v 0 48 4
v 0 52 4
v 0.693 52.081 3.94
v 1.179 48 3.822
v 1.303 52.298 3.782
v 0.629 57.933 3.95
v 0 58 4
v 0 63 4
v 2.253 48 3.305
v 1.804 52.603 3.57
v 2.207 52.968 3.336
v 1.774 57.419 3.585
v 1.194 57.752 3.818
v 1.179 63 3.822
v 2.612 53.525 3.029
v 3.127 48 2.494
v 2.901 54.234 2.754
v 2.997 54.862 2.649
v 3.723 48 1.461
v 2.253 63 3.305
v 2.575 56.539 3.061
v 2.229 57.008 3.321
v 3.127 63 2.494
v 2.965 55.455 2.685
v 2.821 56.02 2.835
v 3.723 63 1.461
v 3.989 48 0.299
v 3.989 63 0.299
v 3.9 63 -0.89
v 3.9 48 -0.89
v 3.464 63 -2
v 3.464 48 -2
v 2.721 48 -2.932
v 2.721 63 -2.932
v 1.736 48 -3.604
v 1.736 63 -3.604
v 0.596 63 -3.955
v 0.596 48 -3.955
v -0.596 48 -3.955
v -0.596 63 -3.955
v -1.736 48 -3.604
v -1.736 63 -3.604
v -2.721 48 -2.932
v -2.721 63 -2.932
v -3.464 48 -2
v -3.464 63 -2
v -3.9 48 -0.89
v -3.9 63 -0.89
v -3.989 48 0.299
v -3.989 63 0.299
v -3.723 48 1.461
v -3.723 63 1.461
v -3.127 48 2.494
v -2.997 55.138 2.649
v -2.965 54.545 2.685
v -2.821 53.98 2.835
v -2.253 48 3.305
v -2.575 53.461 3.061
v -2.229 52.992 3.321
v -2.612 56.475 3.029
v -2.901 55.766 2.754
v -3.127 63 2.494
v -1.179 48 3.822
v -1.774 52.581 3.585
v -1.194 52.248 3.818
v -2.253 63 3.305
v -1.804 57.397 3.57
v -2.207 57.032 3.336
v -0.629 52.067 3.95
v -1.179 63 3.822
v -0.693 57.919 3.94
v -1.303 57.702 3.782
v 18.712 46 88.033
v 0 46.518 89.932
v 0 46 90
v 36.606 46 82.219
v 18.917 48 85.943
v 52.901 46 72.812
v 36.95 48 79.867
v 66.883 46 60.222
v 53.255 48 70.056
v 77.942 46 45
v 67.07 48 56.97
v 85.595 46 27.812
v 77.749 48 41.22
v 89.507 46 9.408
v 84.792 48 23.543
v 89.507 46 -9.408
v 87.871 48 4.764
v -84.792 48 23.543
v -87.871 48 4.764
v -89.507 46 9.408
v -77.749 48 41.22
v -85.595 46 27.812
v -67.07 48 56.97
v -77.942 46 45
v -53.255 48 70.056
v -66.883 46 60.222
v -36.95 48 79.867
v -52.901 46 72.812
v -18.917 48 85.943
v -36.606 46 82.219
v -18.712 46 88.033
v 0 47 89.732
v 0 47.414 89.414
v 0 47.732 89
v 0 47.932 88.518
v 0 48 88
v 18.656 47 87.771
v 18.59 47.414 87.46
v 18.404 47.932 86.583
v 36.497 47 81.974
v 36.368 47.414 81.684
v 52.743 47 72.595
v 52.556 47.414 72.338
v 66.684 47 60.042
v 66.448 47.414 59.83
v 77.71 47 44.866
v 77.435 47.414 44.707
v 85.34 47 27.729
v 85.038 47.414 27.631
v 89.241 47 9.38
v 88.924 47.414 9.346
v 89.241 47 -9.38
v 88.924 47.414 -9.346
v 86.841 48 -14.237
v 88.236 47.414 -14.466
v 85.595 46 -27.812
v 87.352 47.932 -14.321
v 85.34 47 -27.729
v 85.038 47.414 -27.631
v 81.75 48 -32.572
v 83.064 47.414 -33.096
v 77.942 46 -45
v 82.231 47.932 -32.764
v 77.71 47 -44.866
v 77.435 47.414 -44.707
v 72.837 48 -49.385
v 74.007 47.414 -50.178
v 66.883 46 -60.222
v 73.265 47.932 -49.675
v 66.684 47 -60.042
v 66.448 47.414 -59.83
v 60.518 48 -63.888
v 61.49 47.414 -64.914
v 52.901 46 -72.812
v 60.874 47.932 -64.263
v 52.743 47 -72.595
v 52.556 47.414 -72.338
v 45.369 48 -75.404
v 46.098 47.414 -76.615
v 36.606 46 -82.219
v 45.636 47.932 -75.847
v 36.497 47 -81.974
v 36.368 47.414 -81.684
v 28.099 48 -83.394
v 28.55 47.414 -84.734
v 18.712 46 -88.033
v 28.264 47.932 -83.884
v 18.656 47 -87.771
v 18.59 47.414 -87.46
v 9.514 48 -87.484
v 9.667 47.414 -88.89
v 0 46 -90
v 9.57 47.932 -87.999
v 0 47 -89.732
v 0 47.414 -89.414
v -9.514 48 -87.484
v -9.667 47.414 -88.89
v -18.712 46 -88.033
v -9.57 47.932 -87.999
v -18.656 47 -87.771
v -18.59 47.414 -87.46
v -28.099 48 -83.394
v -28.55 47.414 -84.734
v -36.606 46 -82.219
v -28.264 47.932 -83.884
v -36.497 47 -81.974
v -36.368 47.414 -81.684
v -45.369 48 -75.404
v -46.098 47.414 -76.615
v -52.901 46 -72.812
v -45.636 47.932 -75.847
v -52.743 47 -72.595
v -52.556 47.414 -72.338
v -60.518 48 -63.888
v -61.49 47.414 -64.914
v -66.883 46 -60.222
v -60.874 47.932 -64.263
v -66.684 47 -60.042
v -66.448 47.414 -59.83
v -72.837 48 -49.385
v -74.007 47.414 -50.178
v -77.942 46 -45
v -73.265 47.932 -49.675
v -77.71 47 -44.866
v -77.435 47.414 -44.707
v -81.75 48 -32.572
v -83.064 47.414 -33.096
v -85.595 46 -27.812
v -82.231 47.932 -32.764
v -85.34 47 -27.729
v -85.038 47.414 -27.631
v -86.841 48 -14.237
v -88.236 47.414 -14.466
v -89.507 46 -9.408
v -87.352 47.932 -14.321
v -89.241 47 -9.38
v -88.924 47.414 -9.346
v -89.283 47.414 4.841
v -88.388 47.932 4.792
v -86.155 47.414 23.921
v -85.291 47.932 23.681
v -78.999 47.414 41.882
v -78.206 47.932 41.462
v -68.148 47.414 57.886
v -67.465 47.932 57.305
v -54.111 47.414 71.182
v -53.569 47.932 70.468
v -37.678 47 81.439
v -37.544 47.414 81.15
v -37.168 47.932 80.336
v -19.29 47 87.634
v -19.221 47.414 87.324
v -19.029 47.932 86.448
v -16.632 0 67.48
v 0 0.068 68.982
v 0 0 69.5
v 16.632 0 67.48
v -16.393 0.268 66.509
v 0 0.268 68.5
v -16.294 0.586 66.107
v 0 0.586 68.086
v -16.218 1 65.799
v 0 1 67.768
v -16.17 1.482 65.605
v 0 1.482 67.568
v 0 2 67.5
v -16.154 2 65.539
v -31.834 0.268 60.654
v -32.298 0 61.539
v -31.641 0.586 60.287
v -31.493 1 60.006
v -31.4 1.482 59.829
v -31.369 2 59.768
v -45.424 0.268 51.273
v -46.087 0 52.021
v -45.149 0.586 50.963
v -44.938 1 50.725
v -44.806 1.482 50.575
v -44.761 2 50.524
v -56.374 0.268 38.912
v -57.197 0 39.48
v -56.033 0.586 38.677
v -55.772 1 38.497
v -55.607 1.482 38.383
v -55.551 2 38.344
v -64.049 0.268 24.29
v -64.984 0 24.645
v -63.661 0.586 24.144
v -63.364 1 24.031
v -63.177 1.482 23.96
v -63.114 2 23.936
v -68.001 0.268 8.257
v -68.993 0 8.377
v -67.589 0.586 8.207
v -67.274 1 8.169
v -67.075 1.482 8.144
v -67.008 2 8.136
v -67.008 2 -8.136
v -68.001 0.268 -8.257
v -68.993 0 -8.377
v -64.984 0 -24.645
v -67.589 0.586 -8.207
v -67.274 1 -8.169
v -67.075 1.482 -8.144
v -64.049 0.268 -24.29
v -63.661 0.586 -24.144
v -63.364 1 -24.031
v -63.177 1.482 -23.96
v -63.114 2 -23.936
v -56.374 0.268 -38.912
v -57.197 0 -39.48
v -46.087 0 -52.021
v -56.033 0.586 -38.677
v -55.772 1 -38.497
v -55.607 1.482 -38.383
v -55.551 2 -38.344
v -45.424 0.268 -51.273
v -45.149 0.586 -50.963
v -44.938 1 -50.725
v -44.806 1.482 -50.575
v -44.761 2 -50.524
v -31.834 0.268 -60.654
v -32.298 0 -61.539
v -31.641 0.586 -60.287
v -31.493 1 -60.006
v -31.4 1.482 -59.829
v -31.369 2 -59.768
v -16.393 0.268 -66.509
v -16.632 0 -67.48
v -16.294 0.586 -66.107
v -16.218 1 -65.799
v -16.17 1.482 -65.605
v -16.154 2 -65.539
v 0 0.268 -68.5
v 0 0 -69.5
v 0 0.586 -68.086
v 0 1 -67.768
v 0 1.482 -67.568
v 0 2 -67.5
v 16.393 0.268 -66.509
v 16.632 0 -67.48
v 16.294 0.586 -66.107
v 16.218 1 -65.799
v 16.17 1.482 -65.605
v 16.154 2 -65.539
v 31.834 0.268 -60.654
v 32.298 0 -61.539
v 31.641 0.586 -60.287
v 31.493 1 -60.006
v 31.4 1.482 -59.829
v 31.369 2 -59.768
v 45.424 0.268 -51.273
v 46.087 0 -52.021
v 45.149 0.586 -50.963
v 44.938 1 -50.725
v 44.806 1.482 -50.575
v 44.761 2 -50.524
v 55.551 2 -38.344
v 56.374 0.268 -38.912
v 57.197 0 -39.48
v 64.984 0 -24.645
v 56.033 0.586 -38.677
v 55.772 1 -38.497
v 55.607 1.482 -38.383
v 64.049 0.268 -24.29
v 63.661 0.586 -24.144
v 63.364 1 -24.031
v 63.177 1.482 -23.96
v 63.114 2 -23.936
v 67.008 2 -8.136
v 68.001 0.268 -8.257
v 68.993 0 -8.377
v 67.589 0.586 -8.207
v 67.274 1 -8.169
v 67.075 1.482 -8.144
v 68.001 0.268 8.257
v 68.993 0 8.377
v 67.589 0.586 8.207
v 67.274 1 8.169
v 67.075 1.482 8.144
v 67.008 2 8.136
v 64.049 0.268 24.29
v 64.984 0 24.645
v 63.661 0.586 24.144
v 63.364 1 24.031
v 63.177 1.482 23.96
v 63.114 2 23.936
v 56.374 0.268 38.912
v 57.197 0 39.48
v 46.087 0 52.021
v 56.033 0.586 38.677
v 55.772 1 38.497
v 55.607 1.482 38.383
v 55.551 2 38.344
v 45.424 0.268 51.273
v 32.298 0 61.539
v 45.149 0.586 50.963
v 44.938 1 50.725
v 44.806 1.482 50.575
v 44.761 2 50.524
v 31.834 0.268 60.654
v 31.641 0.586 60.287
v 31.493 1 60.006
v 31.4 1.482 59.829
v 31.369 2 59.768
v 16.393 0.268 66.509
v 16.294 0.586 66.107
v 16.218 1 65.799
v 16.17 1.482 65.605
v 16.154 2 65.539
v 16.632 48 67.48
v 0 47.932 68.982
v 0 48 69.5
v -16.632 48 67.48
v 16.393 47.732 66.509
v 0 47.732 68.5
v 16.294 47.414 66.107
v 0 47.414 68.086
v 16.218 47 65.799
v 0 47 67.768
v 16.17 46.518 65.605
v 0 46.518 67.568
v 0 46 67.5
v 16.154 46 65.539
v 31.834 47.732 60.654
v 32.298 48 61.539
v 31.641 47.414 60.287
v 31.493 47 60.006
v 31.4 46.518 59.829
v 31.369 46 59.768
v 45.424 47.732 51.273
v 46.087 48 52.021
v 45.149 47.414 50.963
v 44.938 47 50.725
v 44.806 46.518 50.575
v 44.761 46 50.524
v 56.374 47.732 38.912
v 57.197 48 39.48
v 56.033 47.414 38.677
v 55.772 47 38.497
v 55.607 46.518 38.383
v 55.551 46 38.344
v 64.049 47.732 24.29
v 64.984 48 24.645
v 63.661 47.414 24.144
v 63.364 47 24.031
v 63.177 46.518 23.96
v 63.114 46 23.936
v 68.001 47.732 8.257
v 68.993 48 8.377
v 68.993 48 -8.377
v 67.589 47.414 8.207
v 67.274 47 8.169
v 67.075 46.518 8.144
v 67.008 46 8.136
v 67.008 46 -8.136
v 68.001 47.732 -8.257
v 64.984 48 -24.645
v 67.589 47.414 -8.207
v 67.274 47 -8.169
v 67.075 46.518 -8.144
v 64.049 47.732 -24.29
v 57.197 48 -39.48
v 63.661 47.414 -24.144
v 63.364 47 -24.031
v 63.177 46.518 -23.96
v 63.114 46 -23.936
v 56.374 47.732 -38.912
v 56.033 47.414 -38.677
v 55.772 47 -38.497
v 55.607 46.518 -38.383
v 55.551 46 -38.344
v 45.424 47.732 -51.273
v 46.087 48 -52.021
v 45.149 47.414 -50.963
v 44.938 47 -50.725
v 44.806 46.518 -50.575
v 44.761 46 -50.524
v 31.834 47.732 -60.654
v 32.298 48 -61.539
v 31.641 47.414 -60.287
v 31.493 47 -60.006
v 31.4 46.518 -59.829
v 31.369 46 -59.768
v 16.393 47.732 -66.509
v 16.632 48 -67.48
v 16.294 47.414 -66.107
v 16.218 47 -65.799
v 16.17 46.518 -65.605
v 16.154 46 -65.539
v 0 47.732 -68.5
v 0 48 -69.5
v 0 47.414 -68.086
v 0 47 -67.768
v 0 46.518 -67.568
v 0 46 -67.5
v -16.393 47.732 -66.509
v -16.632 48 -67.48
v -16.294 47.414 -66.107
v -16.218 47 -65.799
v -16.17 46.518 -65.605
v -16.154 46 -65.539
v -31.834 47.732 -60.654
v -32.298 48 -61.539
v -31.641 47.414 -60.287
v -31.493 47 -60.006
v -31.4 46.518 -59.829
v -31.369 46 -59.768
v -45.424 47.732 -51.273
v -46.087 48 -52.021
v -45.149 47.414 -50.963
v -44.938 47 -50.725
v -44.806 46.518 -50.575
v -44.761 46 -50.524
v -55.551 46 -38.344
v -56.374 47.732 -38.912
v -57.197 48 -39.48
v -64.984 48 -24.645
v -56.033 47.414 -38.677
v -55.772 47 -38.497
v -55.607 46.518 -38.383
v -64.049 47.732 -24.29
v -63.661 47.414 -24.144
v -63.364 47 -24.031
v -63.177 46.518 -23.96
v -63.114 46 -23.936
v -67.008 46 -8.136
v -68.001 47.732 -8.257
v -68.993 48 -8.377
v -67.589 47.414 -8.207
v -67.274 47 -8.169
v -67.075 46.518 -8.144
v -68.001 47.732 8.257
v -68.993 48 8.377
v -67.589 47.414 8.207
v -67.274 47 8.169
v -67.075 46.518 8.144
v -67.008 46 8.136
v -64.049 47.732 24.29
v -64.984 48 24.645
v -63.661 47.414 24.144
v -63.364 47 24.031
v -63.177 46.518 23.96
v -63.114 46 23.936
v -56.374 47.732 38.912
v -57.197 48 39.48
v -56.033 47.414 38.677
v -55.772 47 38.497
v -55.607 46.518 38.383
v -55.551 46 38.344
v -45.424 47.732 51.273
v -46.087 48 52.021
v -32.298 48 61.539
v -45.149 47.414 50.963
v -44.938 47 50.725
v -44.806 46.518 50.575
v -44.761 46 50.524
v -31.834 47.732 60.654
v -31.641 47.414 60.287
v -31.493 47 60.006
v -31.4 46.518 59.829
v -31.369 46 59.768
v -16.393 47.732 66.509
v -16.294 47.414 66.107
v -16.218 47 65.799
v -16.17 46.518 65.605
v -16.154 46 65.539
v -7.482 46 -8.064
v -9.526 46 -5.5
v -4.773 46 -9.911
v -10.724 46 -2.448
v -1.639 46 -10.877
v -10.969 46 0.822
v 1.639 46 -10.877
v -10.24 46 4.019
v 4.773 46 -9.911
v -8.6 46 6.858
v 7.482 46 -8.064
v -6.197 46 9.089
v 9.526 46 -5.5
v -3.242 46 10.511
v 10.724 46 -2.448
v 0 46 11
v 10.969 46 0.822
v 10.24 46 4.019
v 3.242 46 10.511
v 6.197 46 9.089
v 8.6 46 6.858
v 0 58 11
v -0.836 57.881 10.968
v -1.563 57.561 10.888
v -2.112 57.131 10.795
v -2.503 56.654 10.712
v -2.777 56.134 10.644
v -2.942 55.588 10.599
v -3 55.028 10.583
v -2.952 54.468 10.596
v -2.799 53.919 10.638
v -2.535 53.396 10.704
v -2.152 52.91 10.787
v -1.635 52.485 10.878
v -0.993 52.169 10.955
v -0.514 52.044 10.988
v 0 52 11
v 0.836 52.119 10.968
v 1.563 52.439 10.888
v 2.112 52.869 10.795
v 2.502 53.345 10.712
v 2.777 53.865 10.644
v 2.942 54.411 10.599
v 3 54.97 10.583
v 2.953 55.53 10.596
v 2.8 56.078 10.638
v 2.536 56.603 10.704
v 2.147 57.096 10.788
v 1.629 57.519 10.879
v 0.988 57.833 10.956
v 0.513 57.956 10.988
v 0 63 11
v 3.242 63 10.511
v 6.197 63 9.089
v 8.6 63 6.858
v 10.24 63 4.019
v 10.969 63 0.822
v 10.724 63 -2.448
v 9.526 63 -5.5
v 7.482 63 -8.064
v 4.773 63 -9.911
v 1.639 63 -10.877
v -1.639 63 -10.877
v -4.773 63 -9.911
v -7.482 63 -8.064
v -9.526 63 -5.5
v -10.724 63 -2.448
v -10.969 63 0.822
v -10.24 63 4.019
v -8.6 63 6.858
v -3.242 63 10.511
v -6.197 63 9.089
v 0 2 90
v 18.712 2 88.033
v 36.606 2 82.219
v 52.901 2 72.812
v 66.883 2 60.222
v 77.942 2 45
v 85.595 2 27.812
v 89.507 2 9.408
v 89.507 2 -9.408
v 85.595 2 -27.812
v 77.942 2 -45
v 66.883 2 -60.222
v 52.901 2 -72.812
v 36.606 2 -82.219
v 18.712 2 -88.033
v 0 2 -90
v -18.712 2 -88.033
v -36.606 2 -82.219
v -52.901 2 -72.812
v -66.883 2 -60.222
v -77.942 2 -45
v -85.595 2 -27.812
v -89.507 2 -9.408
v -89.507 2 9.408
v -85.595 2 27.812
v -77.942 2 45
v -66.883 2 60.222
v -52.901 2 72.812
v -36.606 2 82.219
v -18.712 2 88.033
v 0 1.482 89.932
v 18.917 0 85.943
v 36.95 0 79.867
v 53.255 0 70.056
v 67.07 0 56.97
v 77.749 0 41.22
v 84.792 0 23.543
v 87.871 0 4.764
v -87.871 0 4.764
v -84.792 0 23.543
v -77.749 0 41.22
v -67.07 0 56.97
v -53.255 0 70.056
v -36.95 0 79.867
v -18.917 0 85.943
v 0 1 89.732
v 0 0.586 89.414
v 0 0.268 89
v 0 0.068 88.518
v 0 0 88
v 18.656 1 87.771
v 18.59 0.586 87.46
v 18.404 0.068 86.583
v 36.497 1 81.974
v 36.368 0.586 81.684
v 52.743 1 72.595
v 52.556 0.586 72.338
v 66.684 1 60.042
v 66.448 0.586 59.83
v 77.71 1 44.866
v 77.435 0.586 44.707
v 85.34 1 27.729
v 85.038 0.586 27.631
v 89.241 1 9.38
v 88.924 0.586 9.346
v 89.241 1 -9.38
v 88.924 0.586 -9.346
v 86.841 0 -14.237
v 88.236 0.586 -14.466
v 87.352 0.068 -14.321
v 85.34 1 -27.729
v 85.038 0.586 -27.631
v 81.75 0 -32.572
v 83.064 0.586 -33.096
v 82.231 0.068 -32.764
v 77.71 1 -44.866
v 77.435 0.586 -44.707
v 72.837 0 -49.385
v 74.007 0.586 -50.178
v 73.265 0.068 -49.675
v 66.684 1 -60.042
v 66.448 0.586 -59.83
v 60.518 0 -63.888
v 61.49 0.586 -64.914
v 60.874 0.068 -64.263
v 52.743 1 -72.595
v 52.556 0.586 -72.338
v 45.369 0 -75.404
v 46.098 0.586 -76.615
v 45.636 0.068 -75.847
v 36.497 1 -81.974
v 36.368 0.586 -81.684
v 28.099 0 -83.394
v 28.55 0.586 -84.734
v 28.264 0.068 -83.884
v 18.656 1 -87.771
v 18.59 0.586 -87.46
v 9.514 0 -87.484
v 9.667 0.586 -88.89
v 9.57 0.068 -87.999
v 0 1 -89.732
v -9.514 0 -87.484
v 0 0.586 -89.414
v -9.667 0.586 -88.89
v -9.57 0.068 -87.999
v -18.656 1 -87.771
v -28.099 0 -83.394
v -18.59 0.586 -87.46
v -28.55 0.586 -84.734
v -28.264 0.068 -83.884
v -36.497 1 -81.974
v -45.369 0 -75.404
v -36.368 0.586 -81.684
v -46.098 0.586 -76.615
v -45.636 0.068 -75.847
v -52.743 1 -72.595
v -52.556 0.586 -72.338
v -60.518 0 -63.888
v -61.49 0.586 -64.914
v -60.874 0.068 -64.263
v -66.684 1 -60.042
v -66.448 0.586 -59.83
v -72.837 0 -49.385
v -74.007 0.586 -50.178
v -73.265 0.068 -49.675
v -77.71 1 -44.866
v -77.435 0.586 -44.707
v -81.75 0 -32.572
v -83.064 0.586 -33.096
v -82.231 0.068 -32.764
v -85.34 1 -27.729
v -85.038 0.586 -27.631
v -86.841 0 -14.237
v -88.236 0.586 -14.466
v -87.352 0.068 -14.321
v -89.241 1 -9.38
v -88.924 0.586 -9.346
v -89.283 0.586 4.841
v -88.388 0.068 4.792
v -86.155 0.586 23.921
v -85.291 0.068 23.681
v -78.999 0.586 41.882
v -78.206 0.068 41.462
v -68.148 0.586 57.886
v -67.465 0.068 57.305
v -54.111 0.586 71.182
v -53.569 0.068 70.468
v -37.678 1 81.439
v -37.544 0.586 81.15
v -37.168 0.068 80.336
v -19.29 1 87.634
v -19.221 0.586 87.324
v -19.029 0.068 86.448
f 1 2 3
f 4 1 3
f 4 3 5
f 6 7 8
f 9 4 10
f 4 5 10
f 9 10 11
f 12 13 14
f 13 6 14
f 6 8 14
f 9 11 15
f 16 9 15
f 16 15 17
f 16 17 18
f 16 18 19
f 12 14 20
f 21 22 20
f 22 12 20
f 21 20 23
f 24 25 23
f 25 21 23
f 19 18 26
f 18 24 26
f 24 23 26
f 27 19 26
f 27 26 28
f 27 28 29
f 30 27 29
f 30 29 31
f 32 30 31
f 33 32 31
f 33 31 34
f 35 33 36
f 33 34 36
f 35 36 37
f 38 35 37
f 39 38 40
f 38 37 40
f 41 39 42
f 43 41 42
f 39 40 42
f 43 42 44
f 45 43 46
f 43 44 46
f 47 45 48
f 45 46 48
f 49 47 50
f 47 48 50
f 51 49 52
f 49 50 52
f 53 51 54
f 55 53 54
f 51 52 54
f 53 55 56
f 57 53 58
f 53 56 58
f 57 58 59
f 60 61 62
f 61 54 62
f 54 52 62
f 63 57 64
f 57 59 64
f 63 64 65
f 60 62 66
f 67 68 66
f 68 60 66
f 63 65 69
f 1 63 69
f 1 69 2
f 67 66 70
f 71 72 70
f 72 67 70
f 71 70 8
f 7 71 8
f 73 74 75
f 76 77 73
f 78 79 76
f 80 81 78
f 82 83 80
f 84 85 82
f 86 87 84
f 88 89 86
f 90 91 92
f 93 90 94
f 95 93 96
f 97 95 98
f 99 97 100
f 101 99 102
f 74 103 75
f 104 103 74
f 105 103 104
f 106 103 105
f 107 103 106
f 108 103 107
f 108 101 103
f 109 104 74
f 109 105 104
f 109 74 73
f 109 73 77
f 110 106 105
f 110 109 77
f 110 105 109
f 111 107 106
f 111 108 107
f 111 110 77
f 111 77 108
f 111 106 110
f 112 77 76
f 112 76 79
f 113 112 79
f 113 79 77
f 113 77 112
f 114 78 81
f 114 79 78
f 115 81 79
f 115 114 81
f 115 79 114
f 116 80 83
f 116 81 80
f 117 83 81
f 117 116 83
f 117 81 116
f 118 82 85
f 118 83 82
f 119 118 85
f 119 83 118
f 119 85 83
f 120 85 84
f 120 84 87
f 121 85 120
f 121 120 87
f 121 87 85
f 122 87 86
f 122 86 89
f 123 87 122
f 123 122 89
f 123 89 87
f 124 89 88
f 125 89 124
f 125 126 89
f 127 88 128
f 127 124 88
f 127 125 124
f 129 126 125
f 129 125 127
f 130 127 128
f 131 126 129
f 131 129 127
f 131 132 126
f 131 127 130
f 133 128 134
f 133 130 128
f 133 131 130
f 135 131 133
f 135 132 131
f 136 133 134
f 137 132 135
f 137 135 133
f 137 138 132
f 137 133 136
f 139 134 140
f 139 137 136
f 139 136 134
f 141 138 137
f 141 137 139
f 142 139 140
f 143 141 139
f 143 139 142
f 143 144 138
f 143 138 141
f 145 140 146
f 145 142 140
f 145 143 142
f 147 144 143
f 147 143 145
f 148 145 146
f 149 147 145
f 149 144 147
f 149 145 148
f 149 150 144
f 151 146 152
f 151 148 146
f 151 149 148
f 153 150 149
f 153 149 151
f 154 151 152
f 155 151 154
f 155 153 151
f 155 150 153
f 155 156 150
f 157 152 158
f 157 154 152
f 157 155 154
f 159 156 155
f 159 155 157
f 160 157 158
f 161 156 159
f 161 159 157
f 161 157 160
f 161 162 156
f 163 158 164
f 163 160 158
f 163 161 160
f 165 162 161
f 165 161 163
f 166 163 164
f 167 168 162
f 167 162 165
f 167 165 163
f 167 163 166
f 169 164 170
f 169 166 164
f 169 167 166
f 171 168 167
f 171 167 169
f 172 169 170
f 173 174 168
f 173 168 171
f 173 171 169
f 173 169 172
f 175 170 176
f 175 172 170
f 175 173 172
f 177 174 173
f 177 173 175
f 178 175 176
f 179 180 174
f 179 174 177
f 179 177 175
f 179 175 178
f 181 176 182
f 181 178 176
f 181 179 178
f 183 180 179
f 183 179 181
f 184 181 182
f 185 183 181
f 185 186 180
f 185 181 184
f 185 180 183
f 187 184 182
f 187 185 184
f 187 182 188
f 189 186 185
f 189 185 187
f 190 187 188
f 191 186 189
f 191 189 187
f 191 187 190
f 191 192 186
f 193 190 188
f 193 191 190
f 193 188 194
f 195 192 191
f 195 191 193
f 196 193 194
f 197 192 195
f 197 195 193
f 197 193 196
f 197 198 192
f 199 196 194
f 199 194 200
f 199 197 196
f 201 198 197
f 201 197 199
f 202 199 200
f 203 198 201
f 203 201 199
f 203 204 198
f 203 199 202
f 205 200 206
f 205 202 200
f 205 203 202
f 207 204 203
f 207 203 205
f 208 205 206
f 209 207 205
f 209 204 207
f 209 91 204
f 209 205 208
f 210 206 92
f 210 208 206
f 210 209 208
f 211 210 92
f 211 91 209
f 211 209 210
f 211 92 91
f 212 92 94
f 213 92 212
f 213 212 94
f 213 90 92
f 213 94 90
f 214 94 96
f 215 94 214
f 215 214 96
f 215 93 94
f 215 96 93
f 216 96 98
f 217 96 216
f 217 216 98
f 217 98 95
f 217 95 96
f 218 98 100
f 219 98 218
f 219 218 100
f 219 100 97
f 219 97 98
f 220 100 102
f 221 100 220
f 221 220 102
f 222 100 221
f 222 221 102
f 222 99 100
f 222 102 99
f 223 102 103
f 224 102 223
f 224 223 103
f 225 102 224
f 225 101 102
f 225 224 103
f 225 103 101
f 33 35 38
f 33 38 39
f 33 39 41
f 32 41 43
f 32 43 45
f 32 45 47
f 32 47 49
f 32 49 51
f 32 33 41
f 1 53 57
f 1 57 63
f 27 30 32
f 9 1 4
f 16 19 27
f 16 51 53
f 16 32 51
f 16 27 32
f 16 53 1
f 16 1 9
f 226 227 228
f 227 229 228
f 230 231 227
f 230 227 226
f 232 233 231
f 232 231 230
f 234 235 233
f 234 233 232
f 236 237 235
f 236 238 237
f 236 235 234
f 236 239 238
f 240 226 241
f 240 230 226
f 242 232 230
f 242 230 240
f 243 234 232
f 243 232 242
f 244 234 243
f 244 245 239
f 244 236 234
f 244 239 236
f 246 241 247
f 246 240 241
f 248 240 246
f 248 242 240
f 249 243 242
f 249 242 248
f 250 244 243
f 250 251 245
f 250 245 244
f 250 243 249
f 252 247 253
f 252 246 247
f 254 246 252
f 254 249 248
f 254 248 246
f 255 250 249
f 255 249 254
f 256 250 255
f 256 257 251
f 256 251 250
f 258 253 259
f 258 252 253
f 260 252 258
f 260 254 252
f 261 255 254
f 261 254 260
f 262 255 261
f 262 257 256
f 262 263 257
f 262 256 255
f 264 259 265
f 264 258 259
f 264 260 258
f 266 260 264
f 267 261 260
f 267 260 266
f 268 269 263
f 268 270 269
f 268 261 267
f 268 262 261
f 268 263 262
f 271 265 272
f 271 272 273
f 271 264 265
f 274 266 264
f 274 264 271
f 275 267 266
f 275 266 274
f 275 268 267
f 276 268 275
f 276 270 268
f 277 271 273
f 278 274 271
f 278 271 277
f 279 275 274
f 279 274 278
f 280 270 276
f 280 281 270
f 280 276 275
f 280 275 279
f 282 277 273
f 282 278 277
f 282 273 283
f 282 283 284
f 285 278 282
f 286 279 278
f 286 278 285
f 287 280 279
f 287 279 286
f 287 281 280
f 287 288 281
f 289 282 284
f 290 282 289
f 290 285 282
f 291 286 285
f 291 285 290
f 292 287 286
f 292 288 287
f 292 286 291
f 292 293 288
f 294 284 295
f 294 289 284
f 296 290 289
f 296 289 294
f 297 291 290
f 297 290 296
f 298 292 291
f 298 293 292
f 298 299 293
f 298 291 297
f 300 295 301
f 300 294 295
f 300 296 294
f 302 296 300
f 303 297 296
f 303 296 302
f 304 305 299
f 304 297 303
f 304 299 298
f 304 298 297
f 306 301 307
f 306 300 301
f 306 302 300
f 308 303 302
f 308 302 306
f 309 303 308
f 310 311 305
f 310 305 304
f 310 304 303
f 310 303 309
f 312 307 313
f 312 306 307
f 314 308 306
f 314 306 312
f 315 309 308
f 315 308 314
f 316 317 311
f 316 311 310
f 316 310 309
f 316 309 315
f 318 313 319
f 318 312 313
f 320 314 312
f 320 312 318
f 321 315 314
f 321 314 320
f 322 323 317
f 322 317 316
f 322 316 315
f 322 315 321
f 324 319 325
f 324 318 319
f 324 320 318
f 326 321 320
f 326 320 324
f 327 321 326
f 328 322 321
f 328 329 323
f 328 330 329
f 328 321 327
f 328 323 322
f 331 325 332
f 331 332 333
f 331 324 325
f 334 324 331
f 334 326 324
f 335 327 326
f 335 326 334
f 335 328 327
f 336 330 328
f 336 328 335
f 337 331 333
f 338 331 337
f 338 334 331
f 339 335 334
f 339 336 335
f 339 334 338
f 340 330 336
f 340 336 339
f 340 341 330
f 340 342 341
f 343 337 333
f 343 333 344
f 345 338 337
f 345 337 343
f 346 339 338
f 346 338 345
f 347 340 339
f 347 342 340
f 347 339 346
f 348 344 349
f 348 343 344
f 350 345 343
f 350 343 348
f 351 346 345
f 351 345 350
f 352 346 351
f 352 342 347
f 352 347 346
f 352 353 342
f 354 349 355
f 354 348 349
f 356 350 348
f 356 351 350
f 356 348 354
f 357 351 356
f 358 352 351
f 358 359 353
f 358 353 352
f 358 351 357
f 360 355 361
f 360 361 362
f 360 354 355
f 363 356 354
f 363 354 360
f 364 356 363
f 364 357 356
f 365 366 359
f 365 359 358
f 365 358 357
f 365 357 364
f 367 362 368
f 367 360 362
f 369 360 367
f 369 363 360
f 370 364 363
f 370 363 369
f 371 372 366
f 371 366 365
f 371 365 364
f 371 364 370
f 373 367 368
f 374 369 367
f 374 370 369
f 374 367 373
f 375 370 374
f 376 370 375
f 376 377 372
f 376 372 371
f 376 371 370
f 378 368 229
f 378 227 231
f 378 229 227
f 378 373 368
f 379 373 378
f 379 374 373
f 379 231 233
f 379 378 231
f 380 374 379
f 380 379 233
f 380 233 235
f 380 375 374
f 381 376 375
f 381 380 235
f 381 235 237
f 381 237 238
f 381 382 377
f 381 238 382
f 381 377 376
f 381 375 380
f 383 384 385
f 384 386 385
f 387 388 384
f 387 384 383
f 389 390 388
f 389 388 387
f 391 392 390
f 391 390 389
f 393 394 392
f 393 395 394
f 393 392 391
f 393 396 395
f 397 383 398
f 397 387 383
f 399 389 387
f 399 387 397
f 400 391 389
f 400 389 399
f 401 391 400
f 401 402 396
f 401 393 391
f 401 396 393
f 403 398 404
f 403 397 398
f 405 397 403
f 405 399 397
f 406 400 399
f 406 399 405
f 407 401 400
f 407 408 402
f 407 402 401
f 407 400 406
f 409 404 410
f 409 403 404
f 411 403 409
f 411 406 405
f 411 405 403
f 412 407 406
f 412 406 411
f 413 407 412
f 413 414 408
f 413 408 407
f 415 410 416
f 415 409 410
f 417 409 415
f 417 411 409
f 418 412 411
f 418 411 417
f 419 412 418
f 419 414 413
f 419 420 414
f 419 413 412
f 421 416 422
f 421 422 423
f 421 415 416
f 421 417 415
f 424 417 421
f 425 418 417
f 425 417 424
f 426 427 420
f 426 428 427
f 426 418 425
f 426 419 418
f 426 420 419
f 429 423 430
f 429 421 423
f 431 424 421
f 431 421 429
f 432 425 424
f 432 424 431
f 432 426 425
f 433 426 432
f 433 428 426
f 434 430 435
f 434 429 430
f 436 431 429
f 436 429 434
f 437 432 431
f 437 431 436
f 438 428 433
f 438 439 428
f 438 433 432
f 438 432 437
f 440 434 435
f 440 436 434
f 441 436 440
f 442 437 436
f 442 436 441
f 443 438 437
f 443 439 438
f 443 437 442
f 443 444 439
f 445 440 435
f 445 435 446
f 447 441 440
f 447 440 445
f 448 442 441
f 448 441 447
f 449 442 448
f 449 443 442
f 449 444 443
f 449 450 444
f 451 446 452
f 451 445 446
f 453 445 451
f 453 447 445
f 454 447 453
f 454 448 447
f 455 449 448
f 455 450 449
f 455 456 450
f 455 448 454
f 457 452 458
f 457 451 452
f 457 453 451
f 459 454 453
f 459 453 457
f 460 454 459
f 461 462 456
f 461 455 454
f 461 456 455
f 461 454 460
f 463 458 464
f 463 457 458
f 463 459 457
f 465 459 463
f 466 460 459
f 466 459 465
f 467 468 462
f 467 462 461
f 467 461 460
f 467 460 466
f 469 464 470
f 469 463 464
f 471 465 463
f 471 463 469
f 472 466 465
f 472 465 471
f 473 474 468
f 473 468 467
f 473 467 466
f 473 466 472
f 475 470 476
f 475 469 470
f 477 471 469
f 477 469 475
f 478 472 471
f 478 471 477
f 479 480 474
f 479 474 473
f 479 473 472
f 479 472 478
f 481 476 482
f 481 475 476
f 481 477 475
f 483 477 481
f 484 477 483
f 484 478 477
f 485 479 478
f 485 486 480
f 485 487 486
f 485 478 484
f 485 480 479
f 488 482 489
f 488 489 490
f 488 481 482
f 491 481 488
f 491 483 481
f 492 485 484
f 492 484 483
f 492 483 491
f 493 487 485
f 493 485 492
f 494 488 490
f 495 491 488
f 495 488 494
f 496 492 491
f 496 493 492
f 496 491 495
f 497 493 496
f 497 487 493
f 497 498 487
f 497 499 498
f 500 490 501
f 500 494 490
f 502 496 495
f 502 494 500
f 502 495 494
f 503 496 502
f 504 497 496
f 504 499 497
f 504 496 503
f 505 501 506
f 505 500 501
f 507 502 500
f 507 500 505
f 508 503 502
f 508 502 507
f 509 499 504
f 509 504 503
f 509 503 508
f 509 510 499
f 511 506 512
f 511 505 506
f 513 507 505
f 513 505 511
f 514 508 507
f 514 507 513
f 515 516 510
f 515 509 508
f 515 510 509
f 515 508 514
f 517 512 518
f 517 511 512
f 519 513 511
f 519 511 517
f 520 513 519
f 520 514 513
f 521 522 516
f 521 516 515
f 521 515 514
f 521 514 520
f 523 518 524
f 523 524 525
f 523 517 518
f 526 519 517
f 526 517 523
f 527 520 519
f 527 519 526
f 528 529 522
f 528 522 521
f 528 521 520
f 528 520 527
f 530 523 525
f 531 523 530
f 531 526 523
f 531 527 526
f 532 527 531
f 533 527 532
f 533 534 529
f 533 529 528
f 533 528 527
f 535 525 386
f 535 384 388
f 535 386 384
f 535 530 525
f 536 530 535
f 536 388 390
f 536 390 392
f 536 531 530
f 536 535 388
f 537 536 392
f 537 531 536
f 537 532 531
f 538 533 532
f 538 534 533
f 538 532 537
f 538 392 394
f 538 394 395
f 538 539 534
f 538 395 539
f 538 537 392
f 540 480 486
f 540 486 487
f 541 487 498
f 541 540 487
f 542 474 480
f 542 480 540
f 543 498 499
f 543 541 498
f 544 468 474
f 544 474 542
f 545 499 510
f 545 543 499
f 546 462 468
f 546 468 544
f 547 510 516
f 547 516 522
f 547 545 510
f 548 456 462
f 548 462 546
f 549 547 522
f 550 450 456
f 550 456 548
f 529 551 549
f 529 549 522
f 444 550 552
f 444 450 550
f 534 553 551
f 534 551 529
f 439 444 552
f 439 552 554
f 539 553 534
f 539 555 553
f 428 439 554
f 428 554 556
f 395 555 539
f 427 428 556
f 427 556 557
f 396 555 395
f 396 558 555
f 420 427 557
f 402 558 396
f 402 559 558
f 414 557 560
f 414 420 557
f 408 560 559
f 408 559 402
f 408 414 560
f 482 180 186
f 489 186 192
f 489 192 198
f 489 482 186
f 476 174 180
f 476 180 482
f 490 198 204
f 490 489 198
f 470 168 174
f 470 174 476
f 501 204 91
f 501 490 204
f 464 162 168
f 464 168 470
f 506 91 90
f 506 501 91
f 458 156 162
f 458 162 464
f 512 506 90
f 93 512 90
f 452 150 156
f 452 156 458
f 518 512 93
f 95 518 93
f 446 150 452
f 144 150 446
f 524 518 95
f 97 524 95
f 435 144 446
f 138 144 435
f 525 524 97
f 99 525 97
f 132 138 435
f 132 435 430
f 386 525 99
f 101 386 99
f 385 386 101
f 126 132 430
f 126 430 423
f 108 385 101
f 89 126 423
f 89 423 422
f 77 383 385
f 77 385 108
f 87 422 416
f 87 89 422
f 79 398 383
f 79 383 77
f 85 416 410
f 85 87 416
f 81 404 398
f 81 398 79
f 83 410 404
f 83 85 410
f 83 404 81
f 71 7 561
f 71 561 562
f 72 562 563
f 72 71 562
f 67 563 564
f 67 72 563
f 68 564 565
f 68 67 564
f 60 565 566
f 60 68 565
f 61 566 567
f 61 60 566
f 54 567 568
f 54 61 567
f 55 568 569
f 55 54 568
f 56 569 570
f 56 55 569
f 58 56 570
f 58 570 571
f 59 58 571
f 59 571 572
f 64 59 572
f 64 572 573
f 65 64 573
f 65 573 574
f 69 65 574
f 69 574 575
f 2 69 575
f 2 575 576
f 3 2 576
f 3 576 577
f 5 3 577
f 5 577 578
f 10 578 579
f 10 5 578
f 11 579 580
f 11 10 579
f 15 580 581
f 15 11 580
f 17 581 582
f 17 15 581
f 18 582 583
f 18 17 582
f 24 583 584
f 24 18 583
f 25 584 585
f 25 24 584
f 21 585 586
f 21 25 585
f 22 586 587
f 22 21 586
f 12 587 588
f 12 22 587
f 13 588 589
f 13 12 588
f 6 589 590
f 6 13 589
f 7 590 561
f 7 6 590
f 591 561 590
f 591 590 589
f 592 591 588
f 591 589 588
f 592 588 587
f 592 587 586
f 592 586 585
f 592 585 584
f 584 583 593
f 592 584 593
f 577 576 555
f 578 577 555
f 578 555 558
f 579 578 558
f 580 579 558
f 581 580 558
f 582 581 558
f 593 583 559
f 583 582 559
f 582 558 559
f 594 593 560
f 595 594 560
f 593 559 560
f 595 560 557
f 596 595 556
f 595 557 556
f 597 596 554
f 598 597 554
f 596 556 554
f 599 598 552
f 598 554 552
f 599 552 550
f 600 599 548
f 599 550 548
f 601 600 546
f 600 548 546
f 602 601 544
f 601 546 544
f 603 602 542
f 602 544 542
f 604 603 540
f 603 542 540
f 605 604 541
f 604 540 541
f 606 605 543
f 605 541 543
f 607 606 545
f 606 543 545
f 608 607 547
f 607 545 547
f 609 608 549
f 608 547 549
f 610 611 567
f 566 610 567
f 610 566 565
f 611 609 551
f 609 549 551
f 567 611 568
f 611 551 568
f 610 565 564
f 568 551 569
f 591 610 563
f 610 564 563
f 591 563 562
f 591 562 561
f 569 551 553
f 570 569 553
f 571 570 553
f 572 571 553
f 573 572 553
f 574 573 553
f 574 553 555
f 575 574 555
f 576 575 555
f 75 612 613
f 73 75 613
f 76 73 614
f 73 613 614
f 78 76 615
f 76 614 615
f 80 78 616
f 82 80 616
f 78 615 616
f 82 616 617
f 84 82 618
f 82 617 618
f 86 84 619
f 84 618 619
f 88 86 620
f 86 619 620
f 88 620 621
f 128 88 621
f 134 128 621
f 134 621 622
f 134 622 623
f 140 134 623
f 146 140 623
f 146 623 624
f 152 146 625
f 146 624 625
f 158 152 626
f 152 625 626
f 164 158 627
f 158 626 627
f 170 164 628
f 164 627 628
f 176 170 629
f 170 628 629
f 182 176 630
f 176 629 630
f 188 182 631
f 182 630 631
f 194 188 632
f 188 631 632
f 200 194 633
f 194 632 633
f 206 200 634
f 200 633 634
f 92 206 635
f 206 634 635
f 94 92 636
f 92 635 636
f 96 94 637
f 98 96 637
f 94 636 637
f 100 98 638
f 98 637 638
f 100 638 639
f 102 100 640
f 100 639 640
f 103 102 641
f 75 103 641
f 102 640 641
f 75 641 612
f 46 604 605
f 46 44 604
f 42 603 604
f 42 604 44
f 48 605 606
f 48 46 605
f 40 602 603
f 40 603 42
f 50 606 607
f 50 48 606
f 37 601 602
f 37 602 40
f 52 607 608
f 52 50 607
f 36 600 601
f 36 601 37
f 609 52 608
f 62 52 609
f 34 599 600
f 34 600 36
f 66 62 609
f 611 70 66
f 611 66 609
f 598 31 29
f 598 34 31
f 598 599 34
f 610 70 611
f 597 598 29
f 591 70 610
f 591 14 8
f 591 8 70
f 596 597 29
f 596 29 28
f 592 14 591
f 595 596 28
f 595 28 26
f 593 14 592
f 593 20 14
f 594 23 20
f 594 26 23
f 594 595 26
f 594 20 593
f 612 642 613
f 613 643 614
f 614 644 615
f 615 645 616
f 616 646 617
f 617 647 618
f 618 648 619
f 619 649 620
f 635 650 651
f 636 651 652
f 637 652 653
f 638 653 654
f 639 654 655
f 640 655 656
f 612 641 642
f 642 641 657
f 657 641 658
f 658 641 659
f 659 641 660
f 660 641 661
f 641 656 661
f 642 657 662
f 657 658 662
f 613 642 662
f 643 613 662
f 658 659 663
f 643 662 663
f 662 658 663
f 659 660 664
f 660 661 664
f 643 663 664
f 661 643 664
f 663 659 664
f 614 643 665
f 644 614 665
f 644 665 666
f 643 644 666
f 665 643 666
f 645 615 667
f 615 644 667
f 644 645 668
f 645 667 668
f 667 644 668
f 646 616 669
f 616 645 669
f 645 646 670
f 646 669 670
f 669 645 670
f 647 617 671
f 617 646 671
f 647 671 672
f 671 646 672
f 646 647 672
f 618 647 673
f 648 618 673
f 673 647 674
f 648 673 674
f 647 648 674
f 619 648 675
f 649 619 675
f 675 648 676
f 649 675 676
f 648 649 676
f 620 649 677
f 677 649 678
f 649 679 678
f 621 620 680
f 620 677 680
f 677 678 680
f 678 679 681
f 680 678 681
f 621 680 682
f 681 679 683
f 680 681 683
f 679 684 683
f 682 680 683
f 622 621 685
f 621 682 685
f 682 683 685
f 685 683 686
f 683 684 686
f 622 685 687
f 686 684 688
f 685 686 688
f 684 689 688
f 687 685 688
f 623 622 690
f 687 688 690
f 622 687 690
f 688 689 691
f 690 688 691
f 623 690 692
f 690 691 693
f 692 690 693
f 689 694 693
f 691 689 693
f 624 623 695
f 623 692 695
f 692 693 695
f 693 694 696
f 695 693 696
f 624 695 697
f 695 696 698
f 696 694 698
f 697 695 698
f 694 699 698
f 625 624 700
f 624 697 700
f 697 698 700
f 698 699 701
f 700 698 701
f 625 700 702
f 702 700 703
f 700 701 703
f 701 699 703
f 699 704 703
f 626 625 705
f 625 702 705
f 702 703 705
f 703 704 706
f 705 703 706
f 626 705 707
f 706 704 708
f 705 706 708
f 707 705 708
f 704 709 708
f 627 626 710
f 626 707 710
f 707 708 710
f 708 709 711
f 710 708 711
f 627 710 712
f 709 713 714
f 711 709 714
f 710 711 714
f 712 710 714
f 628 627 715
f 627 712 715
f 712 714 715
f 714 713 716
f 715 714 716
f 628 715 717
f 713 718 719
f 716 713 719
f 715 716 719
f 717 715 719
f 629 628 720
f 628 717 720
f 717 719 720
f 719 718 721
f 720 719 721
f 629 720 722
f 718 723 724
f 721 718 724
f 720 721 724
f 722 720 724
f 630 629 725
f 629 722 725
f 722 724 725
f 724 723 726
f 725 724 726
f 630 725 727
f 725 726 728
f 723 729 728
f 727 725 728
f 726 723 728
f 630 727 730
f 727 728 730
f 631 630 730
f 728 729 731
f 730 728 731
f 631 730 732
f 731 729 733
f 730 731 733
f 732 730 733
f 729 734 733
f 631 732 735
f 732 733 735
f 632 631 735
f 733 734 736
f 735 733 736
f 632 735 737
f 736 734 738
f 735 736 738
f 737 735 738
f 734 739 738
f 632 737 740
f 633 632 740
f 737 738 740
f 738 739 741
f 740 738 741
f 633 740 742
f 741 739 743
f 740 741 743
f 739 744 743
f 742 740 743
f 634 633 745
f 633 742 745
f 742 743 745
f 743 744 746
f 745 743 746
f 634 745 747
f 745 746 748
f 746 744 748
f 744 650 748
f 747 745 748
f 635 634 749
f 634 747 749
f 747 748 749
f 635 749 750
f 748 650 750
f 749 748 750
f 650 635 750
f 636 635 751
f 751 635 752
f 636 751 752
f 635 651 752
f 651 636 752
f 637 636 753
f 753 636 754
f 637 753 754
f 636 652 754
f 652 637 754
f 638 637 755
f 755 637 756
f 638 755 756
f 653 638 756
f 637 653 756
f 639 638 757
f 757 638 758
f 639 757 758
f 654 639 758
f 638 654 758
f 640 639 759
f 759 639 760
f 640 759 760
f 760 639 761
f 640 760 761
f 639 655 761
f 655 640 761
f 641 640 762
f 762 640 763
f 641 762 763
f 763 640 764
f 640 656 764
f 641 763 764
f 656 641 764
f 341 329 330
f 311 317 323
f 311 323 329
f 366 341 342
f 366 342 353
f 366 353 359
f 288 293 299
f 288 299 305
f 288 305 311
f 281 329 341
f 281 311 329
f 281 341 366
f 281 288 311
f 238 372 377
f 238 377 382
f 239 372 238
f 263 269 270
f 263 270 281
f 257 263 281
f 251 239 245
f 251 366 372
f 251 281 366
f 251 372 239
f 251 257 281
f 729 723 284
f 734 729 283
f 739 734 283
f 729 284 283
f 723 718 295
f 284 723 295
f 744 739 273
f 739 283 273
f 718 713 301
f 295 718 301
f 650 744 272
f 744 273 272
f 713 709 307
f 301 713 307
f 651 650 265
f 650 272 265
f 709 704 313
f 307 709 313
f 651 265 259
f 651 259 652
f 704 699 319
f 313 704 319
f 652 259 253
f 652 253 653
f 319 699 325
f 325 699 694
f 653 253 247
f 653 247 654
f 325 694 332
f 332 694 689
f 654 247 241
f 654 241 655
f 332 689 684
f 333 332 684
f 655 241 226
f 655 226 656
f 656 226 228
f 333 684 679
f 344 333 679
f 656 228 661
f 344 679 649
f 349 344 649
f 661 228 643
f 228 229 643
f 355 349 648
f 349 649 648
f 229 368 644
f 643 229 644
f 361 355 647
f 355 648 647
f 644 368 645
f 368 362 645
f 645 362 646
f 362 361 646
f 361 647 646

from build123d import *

# Parameters (mm, degrees)
SKETCH2_R           = 90
BOSS_EXTRUDE1_DEPTH = 48
SKETCH3_R           = 67.5
CUT_EXTRUDE1_DEPTH  = 2
CUT_EXTRUDE2_START  = -2
SKETCH4_R           = 67.5
CUT_EXTRUDE2_DEPTH  = 2
FILLET1_R           = 2
SKETCH_1_R          = 11
EXTRUDE_1_DEPTH     = 17
SKETCH_2_R          = 4
CUT_EXTRUDE_1_DEPTH = 15
SKETCH_3_R          = 3
CUT_EXTRUDE_2_DEPTH = 15


with BuildPart() as part:
    # Sketch2 → Boss-Extrude1 (new body)
    with BuildSketch(Plane(origin=(0, 0, 0), x_dir=(1, 0, 0), z_dir=(0, 1, 0))):
        with Locations(Location((0, 0, 0), (0, 0, 270))):
            Circle(SKETCH2_R)
    extrude(amount=BOSS_EXTRUDE1_DEPTH)

    # Sketch3 → Cut-Extrude1 (cut)
    with BuildSketch(Plane(origin=(0, 48, 0), x_dir=(1, 0, 0), z_dir=(0, 1, 0))):
        with Locations(Location((0, 0, 0), (0, 0, 270))):
            Circle(SKETCH3_R)
    extrude(amount=-CUT_EXTRUDE1_DEPTH, mode=Mode.SUBTRACT)

    # Sketch4 → Cut-Extrude2 (cut)
    with BuildSketch(Plane.XZ.offset(CUT_EXTRUDE2_START)):
        with Locations(Location((0, 0, 0), (0, 0, 90))):
            Circle(SKETCH4_R)
    extrude(amount=CUT_EXTRUDE2_DEPTH, mode=Mode.SUBTRACT)

    # Fillet1
    fillet1_edges = [part.edges().sort_by_distance(p)[0] for p in [
        (0, 0, -67.5),
        (0, 0, -90),
        (0, 48, -90),
        (0, 48, -67.5),
    ]]
    fillet(fillet1_edges, radius=FILLET1_R - 0.0001)  # a hair under: the kernel refuses the full size

    # 草图1 → 凸台-拉伸1 (add)
    with BuildSketch(Plane(origin=(0, 46, 0), x_dir=(1, 0, 0), z_dir=(0, 1, 0))):
        with Locations(Location((0, 0, 0), (0, 0, 270))):
            Circle(SKETCH_1_R)
    extrude(amount=EXTRUDE_1_DEPTH)

    # 草图2 → 切除-拉伸1 (cut)
    with BuildSketch(Plane(origin=(0, 63, 0), x_dir=(1, 0, 0), z_dir=(0, 1, 0))):
        with Locations(Location((0, 0, 0), (0, 0, 270))):
            Circle(SKETCH_2_R)
    extrude(amount=-CUT_EXTRUDE_1_DEPTH, mode=Mode.SUBTRACT)

    # 草图3 → 切除-拉伸2 (cut)
    with BuildSketch(Plane.XY):
        with Locations(Location((0, 55, 0), (0, 0, 90.000000006))):
            Circle(SKETCH_3_R)
    extrude(amount=CUT_EXTRUDE_2_DEPTH, mode=Mode.SUBTRACT)


solid = part.part
